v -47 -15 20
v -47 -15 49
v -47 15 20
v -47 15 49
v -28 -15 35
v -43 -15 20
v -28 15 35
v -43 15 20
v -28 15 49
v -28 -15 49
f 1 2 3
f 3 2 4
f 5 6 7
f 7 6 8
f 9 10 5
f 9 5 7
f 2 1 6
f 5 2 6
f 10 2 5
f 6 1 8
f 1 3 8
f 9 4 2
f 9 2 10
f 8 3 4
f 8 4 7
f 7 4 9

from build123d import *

# Parameters (mm, degrees)
BOX112015002017004005_W     = 19
BOX112015002017004005_H     = 30
BOX112015002017004005_DEPTH = 29
CHAMFER005_SIZE             = 15


with BuildPart() as chamfer005:
    # Box112015002017004005 → Box112015002017004005 (new body)
    with BuildSketch(Plane(origin=(-47, -15, -15), x_dir=(1, 0, 0), z_dir=(0, 0, 1))):
        with Locations((9.5, 15)):
            Rectangle(BOX112015002017004005_W, BOX112015002017004005_H)
    extrude(amount=BOX112015002017004005_DEPTH)

    # Chamfer005
    chamfer005_edges = [chamfer005.edges().sort_by_distance(p)[0] for p in [
        (-28, 0, 14),
    ]]
    chamfer(chamfer005_edges, length=CHAMFER005_SIZE)


with BuildPart() as chamfer005_1:
    # Chamfer005 placement: moved
    add(chamfer005.part.moved(Location((0, 0, 6))))


with BuildPart() as part_mirroring005:
    # Part__Mirroring005: instance of Chamfer005
    add(chamfer005_1.part.mirror(Plane(origin=(0, 0, 20), x_dir=(0, 1, 0), z_dir=(0, 0, 1))))


solid = part_mirroring005.part
